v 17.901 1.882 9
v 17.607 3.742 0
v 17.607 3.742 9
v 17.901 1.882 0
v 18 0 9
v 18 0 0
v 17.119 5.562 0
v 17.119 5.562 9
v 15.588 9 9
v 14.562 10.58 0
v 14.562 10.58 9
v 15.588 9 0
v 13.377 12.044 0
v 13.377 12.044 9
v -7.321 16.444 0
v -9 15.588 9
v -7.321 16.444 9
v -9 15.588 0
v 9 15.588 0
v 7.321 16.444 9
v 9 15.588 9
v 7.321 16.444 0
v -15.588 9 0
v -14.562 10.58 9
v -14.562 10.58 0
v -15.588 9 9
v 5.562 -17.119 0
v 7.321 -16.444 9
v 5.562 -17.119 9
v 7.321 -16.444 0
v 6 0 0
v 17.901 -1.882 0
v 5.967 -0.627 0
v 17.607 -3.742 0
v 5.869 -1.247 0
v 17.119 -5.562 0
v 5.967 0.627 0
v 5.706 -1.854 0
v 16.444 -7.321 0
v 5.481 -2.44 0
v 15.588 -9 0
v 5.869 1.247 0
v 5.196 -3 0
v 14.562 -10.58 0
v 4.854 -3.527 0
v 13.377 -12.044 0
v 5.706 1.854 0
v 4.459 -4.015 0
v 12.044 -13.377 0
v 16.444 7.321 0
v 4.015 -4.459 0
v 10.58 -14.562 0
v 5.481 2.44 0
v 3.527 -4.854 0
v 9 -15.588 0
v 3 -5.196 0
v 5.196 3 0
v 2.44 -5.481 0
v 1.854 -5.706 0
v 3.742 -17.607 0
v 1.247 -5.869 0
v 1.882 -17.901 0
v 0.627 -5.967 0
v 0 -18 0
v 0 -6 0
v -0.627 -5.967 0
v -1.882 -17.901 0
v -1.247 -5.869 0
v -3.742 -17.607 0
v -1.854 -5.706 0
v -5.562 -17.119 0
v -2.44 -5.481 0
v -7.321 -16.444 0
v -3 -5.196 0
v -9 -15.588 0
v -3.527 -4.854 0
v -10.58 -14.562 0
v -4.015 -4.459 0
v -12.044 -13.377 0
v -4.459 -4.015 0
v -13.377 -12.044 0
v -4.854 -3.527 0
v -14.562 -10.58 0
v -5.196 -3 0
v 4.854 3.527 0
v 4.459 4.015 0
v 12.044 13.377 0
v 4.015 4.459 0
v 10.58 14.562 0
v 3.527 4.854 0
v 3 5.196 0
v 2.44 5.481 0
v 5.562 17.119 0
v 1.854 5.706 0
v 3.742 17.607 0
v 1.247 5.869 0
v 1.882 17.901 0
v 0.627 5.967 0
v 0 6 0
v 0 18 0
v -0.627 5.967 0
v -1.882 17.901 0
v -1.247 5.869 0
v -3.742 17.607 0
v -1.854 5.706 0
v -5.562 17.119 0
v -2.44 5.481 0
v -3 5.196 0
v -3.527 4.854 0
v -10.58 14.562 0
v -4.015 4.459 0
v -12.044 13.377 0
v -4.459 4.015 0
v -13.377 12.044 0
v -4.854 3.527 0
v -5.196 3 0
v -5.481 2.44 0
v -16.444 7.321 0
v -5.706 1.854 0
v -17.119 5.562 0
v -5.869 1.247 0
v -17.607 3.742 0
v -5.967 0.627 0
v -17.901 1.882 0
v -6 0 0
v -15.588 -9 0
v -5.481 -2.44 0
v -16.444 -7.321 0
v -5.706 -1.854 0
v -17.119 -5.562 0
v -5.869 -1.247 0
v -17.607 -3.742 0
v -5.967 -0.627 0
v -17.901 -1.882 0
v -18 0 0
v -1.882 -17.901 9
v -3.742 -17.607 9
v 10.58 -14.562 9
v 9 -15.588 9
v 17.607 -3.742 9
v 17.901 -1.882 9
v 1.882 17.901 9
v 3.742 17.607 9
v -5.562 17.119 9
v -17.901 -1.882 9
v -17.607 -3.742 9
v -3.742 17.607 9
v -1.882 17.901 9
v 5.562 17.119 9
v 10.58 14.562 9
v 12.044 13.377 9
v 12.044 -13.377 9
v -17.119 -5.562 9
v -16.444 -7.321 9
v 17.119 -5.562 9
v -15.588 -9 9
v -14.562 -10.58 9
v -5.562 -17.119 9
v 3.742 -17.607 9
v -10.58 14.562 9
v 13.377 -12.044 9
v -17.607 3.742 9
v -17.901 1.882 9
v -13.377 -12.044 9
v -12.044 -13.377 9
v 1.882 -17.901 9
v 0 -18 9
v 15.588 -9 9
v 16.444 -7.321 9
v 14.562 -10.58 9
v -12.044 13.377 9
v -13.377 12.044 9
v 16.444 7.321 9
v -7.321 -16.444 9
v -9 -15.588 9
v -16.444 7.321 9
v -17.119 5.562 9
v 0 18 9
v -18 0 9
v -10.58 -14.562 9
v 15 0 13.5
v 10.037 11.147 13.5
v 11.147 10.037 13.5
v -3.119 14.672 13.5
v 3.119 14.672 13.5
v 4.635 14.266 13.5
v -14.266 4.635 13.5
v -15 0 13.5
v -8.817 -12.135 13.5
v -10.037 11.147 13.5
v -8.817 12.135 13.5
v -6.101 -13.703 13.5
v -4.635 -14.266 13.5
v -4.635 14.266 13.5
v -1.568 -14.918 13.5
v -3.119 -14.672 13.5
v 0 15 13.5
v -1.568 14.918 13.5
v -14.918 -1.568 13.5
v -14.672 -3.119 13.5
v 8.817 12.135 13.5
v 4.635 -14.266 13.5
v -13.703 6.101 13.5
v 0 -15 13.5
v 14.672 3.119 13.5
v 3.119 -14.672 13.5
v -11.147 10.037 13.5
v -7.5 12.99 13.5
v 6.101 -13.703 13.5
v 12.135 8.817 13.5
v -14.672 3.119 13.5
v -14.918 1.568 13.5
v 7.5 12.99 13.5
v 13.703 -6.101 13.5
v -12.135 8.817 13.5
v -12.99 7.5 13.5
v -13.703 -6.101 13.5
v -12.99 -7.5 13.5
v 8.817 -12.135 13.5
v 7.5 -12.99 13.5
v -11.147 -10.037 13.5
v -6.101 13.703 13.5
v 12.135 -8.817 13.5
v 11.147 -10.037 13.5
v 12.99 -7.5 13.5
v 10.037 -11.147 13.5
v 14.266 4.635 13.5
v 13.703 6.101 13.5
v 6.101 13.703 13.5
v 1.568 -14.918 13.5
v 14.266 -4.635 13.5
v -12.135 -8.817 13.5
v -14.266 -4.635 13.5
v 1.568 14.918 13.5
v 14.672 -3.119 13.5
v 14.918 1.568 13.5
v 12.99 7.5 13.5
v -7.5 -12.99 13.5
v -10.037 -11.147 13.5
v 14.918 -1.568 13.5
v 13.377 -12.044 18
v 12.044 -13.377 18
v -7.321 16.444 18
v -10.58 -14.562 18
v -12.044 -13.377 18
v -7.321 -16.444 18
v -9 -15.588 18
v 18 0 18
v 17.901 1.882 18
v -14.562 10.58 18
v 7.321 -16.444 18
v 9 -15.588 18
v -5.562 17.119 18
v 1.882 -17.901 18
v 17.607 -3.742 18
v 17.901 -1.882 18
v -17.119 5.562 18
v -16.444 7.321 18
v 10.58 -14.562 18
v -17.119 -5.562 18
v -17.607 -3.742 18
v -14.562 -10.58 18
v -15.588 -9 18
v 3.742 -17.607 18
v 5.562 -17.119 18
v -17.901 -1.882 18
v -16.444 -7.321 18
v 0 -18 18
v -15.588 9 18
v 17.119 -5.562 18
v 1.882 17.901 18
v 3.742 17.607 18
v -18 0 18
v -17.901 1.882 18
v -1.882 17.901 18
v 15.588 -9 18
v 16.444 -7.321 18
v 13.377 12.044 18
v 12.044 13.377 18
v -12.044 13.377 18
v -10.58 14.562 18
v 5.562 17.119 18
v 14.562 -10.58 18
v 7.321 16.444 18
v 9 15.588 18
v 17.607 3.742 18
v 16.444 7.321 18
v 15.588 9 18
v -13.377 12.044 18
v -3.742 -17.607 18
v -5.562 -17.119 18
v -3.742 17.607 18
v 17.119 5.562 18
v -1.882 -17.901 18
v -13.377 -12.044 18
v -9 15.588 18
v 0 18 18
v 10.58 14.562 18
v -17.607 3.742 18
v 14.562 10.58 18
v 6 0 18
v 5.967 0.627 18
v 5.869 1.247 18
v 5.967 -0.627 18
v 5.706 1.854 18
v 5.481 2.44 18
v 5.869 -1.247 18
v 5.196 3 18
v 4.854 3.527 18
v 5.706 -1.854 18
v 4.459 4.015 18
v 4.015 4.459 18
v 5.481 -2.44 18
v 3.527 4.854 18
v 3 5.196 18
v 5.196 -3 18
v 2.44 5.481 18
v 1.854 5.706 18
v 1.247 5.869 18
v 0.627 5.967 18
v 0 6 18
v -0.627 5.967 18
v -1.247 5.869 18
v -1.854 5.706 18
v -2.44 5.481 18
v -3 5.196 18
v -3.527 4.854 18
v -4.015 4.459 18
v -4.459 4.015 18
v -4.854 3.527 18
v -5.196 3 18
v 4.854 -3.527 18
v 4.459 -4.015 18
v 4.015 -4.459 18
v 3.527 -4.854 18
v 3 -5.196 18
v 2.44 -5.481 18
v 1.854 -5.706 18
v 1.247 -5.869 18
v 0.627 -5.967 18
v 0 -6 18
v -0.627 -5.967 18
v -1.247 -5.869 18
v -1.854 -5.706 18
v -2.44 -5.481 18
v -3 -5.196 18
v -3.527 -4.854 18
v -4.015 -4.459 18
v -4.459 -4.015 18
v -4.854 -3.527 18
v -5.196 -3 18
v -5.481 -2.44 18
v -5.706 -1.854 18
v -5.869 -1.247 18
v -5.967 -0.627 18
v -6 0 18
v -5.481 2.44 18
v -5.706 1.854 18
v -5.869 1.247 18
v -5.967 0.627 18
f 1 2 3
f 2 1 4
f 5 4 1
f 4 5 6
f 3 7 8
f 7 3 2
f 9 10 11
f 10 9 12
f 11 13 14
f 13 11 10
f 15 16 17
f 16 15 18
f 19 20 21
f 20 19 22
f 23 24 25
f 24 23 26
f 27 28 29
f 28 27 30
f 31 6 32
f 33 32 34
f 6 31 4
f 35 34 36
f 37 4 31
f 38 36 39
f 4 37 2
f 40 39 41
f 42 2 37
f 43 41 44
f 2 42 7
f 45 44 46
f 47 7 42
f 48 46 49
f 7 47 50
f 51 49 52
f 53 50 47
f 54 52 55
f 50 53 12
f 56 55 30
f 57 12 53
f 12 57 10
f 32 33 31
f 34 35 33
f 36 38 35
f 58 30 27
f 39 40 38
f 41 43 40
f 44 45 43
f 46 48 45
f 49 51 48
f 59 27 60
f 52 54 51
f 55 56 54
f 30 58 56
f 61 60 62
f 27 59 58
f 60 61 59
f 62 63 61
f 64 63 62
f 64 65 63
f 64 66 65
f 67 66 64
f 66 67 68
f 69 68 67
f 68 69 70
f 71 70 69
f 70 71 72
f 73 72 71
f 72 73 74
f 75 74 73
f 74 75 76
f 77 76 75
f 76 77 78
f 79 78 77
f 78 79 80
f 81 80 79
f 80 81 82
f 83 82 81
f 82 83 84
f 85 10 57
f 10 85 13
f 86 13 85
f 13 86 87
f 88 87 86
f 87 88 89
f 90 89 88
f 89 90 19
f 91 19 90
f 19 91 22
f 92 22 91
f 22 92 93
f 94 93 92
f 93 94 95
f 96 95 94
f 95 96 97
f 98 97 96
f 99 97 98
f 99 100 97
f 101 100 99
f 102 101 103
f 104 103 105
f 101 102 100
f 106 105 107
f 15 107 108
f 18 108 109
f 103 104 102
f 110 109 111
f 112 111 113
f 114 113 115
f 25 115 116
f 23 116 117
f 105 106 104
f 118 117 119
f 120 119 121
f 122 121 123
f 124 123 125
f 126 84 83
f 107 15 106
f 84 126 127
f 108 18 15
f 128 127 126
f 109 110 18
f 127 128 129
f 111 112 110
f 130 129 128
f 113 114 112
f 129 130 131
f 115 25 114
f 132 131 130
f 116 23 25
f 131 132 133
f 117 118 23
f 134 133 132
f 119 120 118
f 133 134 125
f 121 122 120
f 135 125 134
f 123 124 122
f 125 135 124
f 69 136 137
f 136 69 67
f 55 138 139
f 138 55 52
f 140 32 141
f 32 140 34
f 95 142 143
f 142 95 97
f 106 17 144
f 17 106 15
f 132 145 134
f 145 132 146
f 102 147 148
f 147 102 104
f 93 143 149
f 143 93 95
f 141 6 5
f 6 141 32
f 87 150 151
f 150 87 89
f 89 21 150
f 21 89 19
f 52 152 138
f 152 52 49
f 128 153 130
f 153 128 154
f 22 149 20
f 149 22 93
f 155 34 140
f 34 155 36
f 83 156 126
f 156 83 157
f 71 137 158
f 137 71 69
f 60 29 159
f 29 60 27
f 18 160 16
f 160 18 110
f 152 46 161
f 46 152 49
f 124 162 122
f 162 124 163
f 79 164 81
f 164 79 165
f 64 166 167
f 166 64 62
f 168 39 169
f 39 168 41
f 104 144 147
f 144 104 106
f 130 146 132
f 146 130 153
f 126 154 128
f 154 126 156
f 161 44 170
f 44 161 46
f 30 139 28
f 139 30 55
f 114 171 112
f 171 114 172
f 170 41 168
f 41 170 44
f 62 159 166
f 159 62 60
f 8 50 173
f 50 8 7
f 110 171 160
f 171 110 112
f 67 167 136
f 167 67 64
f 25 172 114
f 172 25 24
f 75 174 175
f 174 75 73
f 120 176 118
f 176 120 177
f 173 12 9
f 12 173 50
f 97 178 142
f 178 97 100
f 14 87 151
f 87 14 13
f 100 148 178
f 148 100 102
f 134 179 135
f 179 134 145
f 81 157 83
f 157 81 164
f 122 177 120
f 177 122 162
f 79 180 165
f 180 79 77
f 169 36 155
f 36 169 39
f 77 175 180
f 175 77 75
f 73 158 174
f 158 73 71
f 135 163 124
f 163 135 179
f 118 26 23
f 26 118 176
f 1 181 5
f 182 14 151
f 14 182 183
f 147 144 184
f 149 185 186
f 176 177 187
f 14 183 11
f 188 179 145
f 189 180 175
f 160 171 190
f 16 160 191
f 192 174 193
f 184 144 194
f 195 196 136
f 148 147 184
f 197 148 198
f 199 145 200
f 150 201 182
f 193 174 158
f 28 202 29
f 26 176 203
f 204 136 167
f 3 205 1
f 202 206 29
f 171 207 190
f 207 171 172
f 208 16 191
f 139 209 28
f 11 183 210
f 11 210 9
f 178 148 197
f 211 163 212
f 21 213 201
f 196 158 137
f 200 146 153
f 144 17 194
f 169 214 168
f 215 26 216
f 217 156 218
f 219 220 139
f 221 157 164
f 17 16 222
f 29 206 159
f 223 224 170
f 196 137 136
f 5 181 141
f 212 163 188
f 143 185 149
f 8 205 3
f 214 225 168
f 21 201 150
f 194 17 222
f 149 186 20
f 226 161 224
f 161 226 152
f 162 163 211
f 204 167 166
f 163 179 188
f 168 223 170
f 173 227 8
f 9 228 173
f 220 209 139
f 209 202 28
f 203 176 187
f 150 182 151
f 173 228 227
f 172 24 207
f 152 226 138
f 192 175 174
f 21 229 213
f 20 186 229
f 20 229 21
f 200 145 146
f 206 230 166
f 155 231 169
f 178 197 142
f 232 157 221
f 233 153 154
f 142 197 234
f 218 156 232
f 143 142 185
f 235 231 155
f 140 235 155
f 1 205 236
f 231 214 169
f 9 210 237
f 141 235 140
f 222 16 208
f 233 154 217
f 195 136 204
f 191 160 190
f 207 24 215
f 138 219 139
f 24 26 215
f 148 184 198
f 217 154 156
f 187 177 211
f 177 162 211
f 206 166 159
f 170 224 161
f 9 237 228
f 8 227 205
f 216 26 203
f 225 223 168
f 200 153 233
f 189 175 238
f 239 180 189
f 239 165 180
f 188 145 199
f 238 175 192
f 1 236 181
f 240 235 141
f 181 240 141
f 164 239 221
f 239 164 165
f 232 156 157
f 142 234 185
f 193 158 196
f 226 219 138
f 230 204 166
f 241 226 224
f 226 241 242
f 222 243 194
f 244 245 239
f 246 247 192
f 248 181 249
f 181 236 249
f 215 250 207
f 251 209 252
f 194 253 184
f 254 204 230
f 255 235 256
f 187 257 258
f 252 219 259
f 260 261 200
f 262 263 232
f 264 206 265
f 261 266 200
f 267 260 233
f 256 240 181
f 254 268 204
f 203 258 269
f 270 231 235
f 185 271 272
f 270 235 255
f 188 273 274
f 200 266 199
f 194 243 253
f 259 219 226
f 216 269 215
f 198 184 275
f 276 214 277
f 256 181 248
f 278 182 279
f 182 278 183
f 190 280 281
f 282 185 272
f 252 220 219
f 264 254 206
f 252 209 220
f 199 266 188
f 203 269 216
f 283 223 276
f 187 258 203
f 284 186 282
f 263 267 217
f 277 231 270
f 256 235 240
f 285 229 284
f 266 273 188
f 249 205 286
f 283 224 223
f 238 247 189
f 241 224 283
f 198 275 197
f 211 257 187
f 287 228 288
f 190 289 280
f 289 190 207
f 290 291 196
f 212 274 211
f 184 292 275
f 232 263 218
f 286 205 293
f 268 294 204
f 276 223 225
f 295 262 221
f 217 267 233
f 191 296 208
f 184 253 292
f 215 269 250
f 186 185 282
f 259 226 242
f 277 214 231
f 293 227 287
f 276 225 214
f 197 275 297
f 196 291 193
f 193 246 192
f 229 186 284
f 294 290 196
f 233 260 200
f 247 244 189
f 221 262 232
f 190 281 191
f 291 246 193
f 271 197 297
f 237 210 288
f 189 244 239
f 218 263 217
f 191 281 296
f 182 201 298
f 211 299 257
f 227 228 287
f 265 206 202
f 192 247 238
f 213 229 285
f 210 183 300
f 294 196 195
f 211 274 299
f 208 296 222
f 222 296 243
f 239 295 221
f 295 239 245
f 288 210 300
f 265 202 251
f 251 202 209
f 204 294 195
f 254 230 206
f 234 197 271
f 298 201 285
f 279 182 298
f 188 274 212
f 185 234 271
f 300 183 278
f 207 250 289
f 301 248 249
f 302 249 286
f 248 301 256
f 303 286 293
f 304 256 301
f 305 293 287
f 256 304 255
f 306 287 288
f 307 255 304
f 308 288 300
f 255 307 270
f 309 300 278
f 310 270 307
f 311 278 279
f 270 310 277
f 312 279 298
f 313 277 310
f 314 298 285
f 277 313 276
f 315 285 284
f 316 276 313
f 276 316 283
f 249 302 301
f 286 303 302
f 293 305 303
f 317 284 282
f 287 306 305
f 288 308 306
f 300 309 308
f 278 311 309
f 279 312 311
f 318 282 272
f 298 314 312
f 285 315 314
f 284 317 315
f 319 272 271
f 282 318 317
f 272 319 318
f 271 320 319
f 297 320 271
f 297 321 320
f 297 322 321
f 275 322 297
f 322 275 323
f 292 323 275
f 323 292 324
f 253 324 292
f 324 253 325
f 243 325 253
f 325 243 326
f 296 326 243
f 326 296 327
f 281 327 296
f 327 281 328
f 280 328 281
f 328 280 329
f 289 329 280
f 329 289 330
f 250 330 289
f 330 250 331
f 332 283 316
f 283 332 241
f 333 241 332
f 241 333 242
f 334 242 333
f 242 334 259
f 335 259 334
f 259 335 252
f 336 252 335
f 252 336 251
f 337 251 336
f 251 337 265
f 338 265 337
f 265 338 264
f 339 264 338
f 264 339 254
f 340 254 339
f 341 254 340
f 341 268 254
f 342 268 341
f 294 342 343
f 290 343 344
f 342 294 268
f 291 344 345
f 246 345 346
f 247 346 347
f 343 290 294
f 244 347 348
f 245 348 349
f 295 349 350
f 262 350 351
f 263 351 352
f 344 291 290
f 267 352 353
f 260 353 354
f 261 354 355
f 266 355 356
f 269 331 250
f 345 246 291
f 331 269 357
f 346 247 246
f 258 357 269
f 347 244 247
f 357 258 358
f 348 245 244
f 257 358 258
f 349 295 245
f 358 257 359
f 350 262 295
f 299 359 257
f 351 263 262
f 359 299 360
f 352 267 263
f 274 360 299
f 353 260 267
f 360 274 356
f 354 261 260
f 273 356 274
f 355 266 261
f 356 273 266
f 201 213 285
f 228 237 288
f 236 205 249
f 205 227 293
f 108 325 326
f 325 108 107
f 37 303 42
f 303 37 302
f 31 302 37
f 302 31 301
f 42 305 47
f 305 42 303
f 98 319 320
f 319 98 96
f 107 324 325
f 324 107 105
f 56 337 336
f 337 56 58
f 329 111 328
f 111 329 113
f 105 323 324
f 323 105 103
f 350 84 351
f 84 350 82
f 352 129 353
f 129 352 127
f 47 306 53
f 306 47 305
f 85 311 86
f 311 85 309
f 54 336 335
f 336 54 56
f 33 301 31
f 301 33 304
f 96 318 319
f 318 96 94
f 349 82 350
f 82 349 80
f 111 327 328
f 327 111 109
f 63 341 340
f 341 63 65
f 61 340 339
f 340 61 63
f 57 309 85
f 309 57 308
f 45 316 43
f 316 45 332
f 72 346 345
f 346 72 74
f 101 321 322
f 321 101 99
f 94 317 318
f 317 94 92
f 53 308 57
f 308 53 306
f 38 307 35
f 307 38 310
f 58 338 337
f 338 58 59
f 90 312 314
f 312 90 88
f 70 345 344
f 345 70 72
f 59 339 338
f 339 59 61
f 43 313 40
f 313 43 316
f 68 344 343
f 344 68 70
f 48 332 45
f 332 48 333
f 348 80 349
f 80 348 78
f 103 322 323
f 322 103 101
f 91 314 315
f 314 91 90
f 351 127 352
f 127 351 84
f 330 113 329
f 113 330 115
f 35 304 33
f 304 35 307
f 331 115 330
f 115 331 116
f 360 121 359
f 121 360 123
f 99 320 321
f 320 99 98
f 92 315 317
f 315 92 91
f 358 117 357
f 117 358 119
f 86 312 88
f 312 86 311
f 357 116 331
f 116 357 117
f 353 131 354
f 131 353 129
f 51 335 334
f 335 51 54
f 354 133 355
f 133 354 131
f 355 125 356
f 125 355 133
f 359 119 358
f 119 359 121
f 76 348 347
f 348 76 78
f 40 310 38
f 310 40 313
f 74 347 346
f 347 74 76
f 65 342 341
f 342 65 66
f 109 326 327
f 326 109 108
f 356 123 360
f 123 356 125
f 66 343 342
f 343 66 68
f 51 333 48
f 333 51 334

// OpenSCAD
// V-groove guide wheel.
$fn = 60;
eps = 0.02;
bore_d = 12;
outer_d = 36;
width = 18;
groove_d = outer_d-6;
difference() {
    union() { cylinder(d=outer_d,h=width/2); translate([0,0,width/2]) cylinder(d1=outer_d,d2=groove_d,h=width/4); translate([0,0,3*width/4]) cylinder(d1=groove_d,d2=outer_d,h=width/4); }
    translate([0,0,-eps]) cylinder(d=bore_d,h=width+2*eps);
}
